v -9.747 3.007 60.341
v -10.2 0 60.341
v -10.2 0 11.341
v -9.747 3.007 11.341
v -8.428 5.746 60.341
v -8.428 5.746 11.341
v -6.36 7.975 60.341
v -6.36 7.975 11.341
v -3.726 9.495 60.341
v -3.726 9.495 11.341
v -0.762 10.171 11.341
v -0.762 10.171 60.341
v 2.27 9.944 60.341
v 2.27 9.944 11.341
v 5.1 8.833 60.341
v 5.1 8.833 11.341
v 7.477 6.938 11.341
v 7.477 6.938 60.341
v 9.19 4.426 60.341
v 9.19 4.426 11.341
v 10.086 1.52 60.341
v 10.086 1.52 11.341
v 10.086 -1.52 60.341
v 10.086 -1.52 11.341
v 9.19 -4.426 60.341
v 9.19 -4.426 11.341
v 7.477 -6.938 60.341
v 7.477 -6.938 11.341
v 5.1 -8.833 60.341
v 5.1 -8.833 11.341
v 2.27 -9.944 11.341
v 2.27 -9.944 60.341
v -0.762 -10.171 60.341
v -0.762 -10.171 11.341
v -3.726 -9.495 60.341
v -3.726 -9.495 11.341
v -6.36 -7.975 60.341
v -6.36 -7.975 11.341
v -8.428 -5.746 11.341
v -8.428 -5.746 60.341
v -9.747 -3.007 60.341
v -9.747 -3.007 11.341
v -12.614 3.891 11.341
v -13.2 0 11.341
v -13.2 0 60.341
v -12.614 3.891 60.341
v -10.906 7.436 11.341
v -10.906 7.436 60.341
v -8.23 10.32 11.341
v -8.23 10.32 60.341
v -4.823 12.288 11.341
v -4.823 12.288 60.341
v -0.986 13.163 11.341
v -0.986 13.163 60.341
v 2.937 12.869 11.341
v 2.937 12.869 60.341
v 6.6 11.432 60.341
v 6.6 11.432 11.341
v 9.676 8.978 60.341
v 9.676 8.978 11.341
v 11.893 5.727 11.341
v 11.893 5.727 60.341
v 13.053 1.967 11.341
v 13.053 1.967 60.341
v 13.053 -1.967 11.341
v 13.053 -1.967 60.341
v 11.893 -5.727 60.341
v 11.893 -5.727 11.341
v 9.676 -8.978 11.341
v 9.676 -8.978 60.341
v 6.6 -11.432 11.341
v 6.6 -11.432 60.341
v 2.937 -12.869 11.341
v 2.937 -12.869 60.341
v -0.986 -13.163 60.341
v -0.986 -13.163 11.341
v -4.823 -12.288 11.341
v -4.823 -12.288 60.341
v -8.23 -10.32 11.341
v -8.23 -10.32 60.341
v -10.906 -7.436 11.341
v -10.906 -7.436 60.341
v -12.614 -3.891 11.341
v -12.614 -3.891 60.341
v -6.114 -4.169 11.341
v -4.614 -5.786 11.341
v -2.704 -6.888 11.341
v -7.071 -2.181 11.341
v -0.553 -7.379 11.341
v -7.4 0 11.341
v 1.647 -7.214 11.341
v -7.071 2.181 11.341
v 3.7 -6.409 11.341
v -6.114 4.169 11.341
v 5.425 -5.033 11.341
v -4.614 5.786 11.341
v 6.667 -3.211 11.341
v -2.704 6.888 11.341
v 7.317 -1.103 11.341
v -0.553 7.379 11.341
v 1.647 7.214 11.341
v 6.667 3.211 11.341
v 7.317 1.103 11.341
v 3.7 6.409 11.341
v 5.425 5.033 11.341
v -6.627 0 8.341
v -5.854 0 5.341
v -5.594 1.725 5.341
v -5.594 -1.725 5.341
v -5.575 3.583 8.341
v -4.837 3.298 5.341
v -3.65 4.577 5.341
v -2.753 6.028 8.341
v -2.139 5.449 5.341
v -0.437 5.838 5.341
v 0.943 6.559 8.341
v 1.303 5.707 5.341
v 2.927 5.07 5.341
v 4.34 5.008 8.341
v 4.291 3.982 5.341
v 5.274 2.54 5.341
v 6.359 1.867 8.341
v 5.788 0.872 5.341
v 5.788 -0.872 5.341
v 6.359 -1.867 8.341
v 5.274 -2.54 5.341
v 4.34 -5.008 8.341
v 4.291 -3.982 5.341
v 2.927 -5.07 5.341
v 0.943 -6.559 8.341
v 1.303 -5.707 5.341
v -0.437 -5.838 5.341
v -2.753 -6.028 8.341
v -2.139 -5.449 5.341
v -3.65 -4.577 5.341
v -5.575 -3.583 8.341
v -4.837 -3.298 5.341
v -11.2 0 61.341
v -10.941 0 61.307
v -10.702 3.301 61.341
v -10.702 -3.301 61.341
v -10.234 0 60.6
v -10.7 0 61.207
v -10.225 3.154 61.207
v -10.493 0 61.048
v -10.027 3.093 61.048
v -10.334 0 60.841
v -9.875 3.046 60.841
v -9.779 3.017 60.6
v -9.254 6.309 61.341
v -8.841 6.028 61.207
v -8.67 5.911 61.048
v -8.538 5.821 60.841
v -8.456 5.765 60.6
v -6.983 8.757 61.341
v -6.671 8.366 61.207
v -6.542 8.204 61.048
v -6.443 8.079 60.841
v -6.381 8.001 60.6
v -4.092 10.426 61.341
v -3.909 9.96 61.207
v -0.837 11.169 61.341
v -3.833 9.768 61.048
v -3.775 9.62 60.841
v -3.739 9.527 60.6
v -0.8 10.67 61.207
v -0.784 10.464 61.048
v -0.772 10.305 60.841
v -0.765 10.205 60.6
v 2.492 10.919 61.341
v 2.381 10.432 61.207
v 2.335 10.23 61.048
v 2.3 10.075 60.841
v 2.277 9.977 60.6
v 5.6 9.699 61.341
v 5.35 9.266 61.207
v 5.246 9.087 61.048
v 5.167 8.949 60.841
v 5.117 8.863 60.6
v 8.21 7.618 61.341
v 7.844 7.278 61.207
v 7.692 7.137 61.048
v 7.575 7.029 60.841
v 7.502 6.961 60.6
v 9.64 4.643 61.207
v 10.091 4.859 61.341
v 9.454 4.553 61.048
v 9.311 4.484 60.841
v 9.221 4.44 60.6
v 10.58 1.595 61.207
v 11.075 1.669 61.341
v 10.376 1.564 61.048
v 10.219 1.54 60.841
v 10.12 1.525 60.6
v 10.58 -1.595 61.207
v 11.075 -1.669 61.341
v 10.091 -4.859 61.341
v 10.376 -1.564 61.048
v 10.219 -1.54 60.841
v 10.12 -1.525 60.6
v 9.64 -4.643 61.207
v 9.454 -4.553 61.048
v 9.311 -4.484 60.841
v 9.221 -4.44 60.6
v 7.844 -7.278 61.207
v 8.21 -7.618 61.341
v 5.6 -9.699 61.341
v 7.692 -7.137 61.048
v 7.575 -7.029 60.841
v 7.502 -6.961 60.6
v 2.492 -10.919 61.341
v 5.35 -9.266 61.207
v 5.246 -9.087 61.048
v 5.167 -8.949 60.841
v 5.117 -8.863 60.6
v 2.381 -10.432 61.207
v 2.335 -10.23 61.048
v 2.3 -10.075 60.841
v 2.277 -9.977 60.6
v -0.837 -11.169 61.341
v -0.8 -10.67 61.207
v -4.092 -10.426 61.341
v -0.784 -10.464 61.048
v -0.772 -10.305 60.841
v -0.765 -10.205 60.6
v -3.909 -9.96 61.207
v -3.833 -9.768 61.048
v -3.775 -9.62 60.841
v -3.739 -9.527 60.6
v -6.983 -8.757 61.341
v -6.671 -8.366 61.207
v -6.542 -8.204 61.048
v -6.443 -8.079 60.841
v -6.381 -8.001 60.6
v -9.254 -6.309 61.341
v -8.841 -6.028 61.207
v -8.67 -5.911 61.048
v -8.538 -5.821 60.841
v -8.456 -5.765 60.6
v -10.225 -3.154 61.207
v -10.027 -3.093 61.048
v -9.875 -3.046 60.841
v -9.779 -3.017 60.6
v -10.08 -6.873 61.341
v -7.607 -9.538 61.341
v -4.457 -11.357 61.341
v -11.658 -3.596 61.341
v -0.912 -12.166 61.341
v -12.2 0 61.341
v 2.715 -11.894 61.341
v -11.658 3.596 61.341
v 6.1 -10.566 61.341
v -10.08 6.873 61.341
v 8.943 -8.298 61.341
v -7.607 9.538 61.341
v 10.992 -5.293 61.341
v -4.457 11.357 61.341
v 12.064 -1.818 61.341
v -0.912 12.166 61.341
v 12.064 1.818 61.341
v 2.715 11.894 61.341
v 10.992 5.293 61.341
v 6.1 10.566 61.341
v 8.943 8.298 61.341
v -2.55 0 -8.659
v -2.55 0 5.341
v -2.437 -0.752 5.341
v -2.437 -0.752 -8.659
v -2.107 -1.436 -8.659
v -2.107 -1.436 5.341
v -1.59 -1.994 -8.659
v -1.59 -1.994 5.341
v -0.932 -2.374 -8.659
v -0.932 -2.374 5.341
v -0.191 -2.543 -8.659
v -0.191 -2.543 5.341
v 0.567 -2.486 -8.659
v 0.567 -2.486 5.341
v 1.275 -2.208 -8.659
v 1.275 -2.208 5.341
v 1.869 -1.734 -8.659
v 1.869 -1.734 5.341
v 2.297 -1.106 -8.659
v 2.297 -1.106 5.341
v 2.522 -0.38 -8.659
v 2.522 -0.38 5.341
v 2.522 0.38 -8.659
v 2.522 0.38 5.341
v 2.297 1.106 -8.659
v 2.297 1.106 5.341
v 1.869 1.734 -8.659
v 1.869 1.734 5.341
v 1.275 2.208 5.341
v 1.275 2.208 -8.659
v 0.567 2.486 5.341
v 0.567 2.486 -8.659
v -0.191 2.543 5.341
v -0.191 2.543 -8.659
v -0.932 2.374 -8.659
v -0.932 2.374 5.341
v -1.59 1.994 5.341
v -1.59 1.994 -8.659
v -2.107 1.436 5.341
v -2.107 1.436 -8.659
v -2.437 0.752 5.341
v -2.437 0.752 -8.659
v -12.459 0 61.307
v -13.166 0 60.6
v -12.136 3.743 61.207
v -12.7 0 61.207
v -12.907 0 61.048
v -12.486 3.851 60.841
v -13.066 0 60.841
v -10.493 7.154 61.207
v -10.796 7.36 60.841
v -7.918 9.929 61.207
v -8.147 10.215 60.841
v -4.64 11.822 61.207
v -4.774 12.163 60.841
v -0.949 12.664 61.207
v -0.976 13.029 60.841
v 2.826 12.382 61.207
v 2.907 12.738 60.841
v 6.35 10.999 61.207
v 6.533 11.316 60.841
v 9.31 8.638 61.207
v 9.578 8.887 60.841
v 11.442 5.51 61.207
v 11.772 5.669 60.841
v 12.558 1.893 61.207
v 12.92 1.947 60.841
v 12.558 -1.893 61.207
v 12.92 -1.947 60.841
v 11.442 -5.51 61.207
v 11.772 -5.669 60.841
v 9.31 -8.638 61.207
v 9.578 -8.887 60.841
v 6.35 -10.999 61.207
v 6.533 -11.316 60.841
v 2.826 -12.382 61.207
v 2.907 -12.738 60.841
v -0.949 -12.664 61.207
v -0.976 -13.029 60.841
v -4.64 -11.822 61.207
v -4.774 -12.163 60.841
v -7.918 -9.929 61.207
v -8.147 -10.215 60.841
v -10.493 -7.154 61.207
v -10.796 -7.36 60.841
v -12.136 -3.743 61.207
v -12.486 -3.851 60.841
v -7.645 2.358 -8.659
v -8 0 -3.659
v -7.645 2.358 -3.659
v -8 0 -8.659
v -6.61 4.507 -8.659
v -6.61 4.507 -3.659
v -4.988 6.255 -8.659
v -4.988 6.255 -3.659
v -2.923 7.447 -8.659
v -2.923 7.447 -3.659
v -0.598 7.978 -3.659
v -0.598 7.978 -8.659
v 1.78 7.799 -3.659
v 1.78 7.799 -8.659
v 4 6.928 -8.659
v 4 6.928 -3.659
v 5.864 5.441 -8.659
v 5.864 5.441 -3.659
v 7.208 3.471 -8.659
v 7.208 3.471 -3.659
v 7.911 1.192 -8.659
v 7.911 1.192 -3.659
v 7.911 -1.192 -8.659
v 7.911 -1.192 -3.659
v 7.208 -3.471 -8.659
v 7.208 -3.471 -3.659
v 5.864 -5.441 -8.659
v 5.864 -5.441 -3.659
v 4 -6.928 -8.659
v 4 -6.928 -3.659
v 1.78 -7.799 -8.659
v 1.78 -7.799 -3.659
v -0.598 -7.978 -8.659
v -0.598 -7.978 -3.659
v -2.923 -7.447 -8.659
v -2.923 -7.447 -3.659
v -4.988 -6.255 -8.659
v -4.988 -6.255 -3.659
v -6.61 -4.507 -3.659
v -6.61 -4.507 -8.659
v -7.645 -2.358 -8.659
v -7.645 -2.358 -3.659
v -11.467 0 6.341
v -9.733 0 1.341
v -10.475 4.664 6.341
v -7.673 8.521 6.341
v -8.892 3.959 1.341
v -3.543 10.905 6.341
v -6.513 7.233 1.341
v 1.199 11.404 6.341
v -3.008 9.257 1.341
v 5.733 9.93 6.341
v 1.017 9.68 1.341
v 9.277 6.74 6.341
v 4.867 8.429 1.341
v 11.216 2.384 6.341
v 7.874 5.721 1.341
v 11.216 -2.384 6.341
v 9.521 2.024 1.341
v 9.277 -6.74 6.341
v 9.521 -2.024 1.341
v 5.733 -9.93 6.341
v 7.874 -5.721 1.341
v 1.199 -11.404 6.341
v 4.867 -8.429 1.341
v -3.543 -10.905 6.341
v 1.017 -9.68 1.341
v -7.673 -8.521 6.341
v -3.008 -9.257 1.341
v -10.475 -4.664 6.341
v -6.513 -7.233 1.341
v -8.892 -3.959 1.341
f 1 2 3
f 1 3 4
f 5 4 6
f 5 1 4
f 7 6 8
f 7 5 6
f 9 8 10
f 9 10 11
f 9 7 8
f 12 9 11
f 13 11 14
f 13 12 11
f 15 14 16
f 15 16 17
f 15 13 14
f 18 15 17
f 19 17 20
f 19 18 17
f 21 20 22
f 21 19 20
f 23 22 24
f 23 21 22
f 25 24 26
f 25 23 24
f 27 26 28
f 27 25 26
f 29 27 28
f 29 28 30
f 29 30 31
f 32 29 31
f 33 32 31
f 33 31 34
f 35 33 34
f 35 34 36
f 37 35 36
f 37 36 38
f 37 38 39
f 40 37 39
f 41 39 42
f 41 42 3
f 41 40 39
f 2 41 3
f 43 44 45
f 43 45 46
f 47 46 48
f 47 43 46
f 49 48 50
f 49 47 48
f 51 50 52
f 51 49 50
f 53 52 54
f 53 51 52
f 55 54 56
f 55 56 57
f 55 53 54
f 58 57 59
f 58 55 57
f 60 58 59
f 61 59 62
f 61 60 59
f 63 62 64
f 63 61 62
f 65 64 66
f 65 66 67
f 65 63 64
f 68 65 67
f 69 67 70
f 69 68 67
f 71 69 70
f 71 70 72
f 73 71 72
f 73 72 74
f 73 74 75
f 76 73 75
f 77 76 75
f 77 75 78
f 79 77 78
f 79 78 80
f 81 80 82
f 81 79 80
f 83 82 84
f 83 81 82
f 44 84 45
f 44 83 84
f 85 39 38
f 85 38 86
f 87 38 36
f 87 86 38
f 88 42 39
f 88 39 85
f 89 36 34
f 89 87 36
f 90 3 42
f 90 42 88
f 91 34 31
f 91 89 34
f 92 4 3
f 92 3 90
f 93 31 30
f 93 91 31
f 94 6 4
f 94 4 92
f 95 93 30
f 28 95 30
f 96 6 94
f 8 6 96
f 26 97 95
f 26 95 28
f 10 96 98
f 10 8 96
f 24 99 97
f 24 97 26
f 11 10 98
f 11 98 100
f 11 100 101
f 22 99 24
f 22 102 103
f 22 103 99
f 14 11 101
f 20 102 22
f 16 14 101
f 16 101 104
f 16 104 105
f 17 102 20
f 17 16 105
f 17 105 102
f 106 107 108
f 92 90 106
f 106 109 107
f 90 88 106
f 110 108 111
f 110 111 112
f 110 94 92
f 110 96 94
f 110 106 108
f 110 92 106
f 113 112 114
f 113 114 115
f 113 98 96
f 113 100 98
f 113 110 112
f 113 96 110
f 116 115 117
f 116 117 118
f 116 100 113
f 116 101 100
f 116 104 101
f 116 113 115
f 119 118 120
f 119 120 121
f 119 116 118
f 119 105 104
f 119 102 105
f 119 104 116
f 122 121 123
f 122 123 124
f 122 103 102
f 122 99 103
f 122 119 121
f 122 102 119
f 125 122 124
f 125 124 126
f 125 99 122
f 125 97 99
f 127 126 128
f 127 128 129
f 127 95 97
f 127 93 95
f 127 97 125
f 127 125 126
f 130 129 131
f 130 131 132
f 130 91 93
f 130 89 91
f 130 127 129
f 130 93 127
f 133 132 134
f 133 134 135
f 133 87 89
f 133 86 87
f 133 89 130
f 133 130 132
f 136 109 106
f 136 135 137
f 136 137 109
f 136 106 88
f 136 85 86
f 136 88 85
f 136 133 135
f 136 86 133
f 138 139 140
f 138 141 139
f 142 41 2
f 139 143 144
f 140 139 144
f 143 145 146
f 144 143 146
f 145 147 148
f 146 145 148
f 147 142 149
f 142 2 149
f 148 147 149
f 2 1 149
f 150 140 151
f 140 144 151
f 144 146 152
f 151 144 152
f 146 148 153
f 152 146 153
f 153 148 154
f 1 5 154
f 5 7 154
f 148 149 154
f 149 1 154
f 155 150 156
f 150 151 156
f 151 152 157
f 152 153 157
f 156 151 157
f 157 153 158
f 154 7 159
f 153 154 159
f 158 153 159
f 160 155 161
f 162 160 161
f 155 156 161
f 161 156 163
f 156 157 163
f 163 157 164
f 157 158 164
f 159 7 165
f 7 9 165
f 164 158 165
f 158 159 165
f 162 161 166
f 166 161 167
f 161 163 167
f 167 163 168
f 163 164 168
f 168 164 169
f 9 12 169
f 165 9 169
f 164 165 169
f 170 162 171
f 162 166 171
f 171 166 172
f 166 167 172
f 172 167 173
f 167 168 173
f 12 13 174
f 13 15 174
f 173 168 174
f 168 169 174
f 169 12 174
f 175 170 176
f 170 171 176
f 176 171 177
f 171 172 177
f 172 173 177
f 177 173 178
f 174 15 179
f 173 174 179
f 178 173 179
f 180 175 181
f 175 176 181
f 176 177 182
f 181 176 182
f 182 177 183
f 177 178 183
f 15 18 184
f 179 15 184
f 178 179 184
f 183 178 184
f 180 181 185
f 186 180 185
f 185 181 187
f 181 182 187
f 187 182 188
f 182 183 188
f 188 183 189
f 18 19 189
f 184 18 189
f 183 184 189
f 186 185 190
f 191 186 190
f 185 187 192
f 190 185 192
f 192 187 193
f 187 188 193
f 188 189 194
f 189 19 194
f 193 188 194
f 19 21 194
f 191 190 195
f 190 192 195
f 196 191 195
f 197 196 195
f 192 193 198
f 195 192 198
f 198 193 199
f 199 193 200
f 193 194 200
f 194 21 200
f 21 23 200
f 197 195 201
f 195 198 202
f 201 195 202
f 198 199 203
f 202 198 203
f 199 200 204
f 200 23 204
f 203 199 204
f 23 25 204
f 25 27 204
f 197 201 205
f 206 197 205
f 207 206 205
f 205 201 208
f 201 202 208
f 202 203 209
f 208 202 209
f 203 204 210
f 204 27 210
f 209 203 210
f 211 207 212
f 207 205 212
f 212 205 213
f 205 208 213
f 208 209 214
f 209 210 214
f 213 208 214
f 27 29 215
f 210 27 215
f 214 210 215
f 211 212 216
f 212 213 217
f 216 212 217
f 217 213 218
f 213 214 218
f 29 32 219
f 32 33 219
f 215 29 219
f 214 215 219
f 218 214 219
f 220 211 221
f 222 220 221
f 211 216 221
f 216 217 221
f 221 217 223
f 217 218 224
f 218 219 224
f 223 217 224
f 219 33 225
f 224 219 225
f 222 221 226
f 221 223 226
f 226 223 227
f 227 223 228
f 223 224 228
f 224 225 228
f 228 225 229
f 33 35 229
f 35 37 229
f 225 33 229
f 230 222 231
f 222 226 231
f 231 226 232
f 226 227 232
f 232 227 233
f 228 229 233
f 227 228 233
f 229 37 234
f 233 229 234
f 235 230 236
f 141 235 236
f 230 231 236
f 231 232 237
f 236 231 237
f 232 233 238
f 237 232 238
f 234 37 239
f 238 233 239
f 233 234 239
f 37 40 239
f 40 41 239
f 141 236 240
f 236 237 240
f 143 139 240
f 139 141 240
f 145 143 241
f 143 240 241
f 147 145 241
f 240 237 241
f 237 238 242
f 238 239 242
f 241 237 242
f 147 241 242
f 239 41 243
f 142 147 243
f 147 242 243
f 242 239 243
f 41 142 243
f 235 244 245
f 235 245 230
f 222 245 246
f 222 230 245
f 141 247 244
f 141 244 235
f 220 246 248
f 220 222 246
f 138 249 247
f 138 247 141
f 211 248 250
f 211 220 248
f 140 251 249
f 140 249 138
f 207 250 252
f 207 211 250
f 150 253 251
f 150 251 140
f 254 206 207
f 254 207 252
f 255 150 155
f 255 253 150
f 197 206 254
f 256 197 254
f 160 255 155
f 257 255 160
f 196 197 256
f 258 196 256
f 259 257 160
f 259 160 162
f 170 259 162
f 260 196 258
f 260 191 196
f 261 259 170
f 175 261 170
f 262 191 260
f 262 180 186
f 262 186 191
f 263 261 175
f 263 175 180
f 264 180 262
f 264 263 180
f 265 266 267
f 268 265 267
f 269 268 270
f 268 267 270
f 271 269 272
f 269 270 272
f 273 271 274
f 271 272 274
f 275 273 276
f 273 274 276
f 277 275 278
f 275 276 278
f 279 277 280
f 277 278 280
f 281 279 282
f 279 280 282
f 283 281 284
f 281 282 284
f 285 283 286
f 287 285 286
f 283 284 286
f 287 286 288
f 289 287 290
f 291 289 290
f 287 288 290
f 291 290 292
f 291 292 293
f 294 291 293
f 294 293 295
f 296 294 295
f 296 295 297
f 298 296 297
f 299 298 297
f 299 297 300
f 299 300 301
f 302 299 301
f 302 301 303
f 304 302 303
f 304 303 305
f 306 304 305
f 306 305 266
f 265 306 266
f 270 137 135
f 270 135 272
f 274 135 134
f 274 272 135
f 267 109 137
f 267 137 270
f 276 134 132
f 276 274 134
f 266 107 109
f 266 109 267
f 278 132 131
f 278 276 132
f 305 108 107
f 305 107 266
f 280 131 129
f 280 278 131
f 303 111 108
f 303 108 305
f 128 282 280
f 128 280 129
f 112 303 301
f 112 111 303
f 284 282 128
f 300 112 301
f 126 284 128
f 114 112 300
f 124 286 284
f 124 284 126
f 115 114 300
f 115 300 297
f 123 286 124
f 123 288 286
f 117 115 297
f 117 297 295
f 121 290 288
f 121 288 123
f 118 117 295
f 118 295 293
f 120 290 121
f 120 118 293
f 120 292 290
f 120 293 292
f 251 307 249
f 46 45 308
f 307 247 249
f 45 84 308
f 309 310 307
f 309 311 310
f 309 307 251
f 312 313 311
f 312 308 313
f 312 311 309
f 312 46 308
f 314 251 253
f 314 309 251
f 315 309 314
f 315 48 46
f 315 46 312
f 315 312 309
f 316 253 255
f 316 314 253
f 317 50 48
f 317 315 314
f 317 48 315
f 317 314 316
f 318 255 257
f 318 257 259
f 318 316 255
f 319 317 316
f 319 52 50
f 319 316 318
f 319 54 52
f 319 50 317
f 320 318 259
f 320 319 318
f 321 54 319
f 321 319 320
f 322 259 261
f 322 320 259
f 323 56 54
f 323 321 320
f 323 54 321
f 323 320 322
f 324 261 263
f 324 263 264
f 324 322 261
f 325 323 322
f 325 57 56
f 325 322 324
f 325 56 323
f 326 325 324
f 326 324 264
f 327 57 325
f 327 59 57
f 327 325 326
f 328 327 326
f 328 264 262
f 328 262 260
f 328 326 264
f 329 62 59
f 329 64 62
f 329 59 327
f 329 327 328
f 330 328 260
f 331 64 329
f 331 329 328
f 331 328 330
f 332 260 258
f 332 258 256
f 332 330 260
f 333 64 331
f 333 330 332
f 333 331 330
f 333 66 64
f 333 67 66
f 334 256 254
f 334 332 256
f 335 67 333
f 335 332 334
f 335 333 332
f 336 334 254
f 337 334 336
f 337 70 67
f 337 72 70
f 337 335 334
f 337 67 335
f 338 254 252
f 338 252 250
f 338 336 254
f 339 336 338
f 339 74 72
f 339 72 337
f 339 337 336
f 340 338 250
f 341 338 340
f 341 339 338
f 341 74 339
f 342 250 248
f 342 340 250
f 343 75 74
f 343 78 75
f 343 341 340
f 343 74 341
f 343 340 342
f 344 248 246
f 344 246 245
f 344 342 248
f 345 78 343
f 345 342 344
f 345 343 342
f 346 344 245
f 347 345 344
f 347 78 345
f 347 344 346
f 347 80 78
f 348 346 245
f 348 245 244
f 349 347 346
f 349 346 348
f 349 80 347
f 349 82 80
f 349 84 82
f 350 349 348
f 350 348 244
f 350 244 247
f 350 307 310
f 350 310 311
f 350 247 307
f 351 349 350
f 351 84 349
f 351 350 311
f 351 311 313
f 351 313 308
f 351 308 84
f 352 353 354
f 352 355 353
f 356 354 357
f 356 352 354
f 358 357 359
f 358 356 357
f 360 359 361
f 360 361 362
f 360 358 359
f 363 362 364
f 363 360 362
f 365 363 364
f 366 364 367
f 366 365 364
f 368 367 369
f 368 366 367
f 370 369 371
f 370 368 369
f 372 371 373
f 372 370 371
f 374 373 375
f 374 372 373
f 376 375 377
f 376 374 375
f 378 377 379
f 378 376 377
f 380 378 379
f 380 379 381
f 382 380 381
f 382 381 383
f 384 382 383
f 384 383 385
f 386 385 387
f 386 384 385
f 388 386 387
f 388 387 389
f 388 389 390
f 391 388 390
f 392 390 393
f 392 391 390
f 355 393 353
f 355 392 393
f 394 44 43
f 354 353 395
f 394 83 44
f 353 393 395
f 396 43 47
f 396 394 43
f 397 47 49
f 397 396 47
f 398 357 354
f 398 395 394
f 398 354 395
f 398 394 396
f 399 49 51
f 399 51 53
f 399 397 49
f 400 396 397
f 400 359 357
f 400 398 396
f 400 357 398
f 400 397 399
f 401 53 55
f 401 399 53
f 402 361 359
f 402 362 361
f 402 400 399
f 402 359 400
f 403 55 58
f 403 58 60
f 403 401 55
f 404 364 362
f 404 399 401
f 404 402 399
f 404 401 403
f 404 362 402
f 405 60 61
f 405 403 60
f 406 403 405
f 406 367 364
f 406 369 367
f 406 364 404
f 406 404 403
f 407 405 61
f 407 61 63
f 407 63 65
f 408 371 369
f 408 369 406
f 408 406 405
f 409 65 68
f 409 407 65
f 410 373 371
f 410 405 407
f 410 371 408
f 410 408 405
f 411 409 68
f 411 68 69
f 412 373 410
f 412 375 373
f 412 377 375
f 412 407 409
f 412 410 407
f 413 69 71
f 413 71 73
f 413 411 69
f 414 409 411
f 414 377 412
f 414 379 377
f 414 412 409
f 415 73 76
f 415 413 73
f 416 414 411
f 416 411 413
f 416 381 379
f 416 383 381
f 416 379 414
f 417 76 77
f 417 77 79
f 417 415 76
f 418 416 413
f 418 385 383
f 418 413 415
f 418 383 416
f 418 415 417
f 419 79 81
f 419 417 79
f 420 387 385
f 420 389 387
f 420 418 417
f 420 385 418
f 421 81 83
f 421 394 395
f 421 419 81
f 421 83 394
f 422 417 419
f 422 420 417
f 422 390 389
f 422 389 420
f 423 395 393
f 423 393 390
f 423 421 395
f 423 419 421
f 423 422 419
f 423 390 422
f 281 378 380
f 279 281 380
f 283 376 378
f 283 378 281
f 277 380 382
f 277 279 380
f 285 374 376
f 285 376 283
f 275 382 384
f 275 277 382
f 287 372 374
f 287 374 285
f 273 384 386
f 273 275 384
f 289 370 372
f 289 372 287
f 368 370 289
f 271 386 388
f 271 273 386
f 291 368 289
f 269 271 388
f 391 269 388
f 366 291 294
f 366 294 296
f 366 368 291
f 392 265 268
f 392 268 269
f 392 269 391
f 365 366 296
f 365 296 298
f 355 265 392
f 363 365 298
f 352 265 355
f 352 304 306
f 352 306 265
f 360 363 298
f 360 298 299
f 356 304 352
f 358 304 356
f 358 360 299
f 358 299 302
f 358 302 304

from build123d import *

# Parameters (mm, degrees)
F2_R = 1
F4_D = 5.1


with BuildPart() as f1:
    # F0 (on Front) → F1 (revolve)
    with BuildSketch(Plane.XZ):
        Polygon((-10.2, 61.3408794351), (-13.2, 61.3408794351), (-13.2, 11.3408794351), (-8, -3.6591205649), (-8, -8.6591205649), (0, -8.6591205649), (0, 5.3408794351), (-5.8538794215, 5.3408794351), (-7.4, 11.3408794351), (-10.2, 11.3408794351), align=None)
    revolve(axis=Axis((0, 0, 2.0173949058), (0, 0, -1)))

    # F2
    f2_edges = [f1.edges().sort_by_distance(p)[0] for p in [
        (13.2, 0, 61.340879),
        (10.2, 0, 61.340879),
    ]]
    fillet(f2_edges, radius=F2_R)

    # F4 (through all)
    with Locations(Plane(origin=(0, 0, -8.6591205649), x_dir=(1, 0, 0), z_dir=(0, 0, -1))):
        with Locations((0, 0)):
            Hole(F4_D / 2)


solid = f1.part
